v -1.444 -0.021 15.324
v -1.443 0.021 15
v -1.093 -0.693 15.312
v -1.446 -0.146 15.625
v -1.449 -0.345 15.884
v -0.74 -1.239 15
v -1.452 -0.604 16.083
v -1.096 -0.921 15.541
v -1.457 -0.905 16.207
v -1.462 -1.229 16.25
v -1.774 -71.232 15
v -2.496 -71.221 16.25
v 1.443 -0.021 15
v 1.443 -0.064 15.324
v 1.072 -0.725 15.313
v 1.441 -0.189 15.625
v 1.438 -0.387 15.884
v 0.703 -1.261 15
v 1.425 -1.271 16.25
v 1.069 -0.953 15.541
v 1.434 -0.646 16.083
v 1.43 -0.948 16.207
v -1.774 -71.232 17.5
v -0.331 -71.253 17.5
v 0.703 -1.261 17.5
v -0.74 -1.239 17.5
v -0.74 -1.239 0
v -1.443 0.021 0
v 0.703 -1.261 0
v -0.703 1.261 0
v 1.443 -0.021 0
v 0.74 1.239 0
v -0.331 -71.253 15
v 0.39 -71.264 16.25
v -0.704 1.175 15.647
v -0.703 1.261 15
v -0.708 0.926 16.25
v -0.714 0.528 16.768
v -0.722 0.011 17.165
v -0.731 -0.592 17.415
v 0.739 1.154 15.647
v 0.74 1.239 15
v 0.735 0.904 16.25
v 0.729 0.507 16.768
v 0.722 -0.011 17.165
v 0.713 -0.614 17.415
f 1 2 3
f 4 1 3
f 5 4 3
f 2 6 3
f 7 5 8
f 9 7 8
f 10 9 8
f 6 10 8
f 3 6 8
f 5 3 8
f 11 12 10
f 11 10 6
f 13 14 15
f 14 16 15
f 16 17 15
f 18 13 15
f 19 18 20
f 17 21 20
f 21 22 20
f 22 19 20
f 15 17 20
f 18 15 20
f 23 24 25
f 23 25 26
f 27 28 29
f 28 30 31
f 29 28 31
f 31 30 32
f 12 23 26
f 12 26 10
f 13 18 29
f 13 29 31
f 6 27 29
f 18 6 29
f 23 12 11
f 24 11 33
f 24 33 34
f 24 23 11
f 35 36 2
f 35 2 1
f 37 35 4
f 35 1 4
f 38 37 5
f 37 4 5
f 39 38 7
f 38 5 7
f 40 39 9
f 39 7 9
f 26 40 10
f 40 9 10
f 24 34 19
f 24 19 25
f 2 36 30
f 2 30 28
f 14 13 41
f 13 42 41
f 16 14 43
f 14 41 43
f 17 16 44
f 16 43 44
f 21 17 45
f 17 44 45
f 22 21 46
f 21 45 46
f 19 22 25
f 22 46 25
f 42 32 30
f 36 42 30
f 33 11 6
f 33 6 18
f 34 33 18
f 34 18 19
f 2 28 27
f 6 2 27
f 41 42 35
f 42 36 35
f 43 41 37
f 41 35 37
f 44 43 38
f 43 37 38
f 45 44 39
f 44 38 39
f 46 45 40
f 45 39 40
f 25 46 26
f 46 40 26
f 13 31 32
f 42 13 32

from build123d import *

# Parameters (mm, degrees)
F1_DEPTH = 15
F3_ANGLE = 90
F5_DEPTH = 70


with BuildPart() as f1:
    # F0 (on Top) → F1 (new body)
    with BuildSketch(Plane.XY):
        Polygon((0.7031400781, -1.2605266217), (1.4432181155, -0.0213261408), (0.7400780375, 1.2392004809), (-0.7031400781, 1.2605266217), (-1.4432181155, 0.0213261408), (-0.7400780375, -1.2392004809), align=None)
    extrude(amount=F1_DEPTH)

    # F2 (on face) → F3 (revolve)
    with BuildSketch(Plane.XY.offset(15)):
        Polygon((-1.4432181155, 0.0213261408), (-0.7400780375, -1.2392004809), (0.7031400781, -1.2605266217), (1.4432181155, -0.0213261408), (0.7400780375, 1.2392004809), (-0.7031400781, 1.2605266217), align=None)
    revolve(axis=Axis((-0.0184689797, -1.2498635513, 15), (0.999890841, -0.0147751838, 0)), revolution_arc=F3_ANGLE)

    # F4 (on face) → F5 (join)
    with BuildSketch(Plane(origin=(-0.0184689797, -1.2498635513, 0), x_dir=(0.999890841, -0.0147751838, 0), z_dir=(-0.0147751838, -0.999890841, 0))):
        Polygon((-0.7216878365, 15), (0.7216878365, 15), (1.443375673, 16.25), (0.7216878365, 17.5), (-0.7216878365, 17.5), (-1.443375673, 16.25), align=None)
    extrude(amount=F5_DEPTH)


solid = f1.part
